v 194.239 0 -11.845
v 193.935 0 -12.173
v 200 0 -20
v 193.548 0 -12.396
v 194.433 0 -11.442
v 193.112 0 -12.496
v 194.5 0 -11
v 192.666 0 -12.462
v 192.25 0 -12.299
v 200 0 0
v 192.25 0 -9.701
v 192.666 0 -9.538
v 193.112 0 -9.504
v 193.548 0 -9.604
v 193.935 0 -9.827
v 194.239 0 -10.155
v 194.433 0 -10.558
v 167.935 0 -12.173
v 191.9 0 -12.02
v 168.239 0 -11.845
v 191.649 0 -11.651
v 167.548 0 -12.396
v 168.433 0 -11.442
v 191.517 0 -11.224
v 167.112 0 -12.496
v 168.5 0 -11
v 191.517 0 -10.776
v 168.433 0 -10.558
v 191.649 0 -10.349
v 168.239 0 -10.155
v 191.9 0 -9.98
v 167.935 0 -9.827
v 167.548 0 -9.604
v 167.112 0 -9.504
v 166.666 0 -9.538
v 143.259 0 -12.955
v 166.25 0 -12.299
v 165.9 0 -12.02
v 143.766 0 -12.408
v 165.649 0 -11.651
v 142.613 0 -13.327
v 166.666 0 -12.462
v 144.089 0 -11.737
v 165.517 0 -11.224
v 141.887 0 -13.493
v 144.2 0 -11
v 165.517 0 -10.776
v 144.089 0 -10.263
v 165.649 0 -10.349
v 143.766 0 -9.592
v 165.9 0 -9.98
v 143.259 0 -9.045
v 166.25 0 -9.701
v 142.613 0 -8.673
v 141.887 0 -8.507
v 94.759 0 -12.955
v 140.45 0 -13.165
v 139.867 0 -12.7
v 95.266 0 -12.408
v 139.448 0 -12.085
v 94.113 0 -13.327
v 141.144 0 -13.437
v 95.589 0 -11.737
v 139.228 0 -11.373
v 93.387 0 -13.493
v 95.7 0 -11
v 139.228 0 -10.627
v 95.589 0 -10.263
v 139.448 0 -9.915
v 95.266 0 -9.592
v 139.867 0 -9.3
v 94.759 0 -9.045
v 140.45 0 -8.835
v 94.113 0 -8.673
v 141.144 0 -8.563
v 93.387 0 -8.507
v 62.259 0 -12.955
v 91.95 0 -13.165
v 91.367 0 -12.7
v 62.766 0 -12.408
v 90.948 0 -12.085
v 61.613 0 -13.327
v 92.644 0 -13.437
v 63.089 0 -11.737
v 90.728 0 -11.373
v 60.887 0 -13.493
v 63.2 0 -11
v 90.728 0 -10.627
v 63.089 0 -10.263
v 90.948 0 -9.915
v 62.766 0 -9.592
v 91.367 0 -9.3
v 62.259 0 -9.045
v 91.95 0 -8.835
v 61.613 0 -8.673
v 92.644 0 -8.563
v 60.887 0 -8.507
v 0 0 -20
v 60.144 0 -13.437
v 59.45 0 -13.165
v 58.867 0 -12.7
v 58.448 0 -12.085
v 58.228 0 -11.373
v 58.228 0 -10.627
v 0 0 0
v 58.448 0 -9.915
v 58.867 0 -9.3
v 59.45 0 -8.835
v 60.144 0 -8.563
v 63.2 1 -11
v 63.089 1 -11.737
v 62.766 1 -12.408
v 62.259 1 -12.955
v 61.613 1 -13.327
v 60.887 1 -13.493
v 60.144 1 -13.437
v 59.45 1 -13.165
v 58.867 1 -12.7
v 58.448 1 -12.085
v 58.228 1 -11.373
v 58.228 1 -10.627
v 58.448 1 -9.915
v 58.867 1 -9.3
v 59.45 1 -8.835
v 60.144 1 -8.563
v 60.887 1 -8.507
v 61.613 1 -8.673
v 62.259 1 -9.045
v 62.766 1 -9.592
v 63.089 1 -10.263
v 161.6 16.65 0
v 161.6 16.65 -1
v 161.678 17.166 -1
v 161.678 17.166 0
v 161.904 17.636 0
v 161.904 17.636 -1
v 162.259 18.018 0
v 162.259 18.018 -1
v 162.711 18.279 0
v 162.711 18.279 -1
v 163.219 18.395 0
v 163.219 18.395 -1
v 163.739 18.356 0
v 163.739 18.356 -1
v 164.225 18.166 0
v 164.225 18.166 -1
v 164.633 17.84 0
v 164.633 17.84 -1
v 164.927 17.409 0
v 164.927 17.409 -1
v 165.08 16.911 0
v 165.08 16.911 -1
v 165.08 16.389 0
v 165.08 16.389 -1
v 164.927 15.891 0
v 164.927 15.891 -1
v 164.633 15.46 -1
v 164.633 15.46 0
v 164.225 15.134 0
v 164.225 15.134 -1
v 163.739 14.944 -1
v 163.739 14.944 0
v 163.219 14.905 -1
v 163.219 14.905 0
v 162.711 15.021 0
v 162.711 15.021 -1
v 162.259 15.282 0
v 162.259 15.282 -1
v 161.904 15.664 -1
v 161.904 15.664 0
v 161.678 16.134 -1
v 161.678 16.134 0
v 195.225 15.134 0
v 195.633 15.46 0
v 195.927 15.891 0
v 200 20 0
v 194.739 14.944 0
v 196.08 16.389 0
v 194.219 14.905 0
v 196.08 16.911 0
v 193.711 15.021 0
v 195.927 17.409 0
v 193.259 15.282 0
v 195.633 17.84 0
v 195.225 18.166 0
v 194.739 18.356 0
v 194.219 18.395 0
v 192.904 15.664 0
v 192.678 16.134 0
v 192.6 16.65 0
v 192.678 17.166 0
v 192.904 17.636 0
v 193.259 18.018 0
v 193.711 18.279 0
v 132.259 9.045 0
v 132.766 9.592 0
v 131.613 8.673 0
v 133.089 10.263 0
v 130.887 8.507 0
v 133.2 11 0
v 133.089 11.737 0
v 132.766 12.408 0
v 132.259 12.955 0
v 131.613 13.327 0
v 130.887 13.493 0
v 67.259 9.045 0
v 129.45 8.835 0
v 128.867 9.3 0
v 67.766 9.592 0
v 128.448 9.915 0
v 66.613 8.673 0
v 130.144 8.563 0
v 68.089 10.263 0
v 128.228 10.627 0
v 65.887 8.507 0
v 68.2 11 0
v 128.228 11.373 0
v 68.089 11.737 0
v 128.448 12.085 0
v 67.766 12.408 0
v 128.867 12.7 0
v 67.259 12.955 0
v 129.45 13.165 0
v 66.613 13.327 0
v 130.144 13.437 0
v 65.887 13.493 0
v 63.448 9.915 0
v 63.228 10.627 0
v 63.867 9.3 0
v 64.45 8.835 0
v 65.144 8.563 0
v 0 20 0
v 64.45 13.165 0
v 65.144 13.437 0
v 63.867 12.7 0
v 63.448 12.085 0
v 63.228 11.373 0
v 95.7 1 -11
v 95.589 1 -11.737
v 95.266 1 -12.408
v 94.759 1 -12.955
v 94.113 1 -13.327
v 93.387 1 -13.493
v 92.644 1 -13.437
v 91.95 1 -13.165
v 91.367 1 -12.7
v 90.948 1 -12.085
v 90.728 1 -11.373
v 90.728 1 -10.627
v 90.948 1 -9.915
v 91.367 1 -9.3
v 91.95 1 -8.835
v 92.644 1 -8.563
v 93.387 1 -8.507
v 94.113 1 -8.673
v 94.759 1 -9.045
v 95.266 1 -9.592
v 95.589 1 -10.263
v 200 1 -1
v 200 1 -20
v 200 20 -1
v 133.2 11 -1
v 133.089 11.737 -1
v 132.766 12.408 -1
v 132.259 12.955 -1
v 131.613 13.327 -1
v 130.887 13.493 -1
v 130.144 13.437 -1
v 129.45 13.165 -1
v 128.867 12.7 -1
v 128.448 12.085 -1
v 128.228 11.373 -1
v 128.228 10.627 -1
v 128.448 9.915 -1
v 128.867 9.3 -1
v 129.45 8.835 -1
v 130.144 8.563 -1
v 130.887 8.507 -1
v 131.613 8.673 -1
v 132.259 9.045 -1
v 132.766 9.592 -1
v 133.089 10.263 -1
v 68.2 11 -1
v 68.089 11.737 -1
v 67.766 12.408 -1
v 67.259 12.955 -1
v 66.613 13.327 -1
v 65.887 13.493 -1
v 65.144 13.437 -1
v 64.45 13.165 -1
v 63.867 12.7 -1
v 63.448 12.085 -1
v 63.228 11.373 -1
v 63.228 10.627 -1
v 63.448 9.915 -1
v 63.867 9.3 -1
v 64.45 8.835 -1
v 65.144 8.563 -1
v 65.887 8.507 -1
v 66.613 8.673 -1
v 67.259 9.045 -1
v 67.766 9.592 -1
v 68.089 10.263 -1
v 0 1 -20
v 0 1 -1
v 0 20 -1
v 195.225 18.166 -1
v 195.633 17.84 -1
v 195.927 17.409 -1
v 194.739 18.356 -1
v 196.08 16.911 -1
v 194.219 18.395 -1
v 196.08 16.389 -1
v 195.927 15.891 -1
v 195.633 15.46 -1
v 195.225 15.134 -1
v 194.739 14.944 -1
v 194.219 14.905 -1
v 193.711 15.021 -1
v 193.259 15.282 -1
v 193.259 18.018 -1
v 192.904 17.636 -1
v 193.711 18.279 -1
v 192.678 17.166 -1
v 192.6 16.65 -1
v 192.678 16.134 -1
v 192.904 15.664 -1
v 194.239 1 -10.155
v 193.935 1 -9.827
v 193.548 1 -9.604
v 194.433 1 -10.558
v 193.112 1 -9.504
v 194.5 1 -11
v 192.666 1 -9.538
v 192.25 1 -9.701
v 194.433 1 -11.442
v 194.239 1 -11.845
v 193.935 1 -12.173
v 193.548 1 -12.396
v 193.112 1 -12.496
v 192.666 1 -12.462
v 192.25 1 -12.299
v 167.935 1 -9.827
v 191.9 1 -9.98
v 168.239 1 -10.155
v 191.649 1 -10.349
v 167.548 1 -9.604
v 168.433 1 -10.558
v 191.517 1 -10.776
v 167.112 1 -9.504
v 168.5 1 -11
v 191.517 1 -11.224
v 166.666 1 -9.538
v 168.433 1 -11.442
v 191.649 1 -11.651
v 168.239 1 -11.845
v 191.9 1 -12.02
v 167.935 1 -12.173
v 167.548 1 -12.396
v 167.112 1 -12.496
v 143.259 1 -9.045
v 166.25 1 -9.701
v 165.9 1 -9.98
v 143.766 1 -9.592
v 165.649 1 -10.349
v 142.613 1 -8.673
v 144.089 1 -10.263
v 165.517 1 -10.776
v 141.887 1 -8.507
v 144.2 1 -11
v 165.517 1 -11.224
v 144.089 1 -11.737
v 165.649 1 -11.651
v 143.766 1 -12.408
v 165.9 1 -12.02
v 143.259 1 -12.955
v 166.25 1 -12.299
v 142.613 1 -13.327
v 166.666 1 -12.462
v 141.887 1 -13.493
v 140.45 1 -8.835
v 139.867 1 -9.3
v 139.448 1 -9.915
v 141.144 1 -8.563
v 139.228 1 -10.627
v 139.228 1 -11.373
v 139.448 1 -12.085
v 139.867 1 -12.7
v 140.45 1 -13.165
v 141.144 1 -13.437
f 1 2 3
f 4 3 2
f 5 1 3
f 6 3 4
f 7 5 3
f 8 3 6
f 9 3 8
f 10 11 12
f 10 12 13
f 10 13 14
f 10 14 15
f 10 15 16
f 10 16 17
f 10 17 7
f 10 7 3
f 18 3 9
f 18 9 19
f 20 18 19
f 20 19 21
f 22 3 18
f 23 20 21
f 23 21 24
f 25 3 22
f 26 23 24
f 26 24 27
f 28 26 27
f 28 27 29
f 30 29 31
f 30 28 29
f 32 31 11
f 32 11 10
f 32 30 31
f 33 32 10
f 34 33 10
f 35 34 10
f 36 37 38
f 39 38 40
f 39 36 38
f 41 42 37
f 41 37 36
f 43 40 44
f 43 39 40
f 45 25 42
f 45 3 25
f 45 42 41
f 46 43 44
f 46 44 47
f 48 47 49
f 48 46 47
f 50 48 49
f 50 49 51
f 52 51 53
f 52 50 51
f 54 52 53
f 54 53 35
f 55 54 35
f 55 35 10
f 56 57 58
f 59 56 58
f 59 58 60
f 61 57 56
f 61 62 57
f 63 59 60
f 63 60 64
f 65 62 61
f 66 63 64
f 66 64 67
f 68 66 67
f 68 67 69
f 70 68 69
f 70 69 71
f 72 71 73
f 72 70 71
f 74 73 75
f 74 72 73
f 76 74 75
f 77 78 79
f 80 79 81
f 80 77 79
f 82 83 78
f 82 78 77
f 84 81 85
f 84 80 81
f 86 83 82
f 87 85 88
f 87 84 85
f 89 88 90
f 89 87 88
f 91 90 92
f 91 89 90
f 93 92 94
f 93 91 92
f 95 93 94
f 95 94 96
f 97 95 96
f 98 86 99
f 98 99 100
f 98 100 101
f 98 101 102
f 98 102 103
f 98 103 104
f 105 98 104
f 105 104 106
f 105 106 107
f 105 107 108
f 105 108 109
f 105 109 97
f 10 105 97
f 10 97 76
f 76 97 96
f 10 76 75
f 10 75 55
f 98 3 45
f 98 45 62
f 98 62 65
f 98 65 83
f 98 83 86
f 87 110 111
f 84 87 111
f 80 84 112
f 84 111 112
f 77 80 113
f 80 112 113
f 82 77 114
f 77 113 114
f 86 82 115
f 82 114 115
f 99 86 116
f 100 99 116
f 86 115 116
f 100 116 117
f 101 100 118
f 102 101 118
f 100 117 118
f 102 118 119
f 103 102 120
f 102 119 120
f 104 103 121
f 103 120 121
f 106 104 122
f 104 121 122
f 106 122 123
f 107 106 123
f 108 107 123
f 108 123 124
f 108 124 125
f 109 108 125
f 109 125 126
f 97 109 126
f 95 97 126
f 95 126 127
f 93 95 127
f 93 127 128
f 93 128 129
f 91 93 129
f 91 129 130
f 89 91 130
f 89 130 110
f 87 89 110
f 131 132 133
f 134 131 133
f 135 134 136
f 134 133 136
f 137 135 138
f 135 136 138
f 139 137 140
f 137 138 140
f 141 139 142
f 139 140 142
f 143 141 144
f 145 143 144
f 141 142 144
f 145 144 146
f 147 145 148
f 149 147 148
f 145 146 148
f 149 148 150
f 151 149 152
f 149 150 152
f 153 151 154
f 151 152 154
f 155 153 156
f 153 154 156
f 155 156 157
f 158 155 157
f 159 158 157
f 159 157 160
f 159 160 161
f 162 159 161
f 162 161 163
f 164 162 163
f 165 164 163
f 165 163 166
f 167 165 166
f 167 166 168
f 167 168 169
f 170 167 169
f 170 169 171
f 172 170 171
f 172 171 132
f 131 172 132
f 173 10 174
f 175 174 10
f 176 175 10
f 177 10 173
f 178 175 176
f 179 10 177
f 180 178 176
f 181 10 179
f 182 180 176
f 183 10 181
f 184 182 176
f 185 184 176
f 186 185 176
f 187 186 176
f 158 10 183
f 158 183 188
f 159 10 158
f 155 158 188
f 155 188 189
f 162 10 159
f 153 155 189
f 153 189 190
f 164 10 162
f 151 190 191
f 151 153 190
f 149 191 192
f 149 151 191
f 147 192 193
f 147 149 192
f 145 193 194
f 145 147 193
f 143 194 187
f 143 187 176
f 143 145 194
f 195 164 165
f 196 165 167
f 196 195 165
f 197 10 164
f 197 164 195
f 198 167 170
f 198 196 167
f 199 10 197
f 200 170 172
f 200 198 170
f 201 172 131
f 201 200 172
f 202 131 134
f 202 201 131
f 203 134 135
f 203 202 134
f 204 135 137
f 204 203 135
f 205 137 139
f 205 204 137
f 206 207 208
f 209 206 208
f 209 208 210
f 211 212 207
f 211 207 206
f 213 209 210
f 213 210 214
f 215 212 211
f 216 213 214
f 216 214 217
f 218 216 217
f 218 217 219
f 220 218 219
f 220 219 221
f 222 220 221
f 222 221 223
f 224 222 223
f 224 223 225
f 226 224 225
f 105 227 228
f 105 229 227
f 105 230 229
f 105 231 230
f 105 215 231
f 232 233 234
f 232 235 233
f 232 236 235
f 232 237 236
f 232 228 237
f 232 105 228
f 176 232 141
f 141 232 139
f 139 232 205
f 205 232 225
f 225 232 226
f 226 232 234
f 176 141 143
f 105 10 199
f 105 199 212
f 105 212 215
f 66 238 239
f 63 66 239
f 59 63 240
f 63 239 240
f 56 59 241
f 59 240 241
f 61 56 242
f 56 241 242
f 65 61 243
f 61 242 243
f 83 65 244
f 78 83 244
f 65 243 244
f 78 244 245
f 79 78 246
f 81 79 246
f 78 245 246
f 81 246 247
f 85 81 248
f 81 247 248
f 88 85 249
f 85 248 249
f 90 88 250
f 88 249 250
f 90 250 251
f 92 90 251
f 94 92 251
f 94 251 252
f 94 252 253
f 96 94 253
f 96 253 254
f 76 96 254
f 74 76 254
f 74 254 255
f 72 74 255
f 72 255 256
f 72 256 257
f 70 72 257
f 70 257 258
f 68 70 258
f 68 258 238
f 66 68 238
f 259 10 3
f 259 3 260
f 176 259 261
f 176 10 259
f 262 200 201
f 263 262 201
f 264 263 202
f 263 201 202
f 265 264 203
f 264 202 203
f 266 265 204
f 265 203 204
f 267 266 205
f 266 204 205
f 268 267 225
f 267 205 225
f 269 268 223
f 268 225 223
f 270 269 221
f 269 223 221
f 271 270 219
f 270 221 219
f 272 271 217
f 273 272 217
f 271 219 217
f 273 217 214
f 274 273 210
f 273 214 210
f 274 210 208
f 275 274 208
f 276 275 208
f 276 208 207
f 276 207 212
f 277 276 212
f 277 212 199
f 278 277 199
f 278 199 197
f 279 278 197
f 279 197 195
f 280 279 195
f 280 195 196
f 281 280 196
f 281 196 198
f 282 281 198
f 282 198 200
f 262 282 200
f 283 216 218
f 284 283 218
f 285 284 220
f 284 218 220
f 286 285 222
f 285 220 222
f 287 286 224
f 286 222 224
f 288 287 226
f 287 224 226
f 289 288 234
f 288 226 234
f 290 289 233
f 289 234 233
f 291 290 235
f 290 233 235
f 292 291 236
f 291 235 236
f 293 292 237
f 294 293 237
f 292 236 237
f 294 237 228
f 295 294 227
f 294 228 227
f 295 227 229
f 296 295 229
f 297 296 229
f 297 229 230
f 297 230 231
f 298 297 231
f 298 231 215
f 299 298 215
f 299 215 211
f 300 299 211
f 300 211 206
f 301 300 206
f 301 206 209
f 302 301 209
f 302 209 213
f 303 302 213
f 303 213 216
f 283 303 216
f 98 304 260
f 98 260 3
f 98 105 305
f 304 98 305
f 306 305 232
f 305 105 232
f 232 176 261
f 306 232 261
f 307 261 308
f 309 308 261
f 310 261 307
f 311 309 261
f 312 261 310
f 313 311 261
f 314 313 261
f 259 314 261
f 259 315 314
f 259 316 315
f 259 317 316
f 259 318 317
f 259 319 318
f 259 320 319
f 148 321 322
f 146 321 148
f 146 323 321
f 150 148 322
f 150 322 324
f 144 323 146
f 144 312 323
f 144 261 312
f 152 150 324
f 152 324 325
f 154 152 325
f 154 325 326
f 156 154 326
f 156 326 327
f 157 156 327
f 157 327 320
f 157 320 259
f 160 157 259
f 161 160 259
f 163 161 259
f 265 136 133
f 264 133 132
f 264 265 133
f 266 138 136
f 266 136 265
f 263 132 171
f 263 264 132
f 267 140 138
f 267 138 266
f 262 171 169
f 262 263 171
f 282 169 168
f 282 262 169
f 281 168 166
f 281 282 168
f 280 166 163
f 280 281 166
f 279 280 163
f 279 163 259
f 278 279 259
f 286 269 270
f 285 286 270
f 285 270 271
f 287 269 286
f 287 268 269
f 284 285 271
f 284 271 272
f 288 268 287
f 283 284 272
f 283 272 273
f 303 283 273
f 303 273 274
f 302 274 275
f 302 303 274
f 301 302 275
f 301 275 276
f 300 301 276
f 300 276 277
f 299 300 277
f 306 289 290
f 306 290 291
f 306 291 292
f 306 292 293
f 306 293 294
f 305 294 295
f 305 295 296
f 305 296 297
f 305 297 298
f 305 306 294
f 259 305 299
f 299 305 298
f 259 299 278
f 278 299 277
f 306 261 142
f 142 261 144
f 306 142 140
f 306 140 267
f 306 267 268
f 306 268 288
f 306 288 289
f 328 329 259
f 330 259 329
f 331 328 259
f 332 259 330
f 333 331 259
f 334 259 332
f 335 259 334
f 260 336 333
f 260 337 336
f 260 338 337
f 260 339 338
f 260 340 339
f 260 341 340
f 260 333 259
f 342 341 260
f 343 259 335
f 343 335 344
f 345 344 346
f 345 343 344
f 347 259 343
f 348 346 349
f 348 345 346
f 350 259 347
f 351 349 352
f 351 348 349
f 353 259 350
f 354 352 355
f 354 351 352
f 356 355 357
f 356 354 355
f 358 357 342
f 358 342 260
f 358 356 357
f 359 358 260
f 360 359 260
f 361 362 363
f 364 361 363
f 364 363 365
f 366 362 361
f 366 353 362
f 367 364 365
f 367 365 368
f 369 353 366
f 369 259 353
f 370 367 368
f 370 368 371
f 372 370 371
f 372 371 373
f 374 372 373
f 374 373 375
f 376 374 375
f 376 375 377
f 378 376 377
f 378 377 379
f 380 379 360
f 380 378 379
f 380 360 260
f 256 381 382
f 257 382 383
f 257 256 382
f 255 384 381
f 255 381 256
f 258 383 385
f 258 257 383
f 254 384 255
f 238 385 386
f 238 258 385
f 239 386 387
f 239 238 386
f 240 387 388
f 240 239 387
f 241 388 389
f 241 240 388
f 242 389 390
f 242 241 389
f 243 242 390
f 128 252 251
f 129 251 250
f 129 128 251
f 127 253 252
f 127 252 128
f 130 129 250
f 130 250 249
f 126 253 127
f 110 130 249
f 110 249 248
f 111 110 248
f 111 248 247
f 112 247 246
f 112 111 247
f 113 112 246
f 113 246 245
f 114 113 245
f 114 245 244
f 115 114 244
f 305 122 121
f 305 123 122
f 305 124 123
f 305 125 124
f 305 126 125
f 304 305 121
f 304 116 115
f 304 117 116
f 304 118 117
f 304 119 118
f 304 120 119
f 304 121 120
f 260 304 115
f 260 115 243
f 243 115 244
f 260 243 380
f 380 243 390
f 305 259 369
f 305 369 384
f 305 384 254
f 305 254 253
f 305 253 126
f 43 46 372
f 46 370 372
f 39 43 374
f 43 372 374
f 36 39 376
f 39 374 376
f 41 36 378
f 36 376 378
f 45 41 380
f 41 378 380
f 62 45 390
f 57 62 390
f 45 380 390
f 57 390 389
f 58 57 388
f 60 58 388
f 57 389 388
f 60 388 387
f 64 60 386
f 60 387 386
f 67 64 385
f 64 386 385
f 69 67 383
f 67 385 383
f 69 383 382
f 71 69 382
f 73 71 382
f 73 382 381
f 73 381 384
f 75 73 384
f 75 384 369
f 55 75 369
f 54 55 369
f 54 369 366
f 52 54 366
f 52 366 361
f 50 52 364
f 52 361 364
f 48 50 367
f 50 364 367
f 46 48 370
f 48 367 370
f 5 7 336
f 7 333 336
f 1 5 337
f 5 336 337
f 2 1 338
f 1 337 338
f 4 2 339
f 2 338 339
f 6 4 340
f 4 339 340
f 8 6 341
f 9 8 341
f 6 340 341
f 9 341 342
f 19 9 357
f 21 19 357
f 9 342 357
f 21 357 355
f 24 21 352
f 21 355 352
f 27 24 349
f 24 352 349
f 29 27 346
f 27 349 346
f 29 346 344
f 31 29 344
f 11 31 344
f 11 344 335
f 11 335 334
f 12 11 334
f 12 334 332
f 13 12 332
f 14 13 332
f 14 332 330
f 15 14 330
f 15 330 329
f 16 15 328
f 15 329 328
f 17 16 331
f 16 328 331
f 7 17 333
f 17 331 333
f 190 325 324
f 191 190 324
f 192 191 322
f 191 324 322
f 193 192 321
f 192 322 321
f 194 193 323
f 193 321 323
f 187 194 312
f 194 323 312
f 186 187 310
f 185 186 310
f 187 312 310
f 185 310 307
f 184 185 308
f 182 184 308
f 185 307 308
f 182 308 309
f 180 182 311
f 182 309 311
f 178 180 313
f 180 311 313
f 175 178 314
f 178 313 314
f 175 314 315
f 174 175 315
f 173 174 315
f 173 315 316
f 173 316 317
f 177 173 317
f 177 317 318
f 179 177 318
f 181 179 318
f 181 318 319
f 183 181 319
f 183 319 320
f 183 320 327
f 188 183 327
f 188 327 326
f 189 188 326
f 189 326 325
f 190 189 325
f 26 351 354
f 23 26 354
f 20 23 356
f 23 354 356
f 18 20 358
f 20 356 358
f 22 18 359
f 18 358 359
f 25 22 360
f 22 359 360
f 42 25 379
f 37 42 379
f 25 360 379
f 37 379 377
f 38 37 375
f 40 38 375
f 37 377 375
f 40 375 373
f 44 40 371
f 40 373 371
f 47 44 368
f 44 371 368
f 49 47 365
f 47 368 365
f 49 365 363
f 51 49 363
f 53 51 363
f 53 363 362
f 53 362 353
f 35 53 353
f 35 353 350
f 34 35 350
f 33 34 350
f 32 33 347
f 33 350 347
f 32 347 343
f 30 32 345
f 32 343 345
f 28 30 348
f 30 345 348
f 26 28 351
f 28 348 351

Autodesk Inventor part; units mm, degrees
ref_plane "YZ Plane" through (0, 0, 0) normal (1, 0, 0) x (0, 1, 0)
ref_plane "XZ Plane" through (0, 0, 0) normal (0, 1, 0) x (-1, 0, 0)
ref_plane "XY Plane" through (0, 0, 0) normal (0, 0, 1) x (1, 0, 0)
sketch "Boceto1" plane through (0, 0, 0) normal (1, 0, 0) x (0, 1, 0)
  line L0 (0, 0) -> (20, 0)
  line L1 (20, 0) -> (20, -1)
  line L2 (20, -1) -> (0, -1)
  line L3 (0, -1) -> (0, 0)
  line L4 (0, 0) -> (1, 0)
  line L5 (1, 0) -> (1, -20)
  line L6 (1, -20) -> (0, -20)
  line L7 (0, -20) -> (0, 0)
  point P0 (1, -1)
  dimension "d0" = 20
  dimension "d1" = 20
  dimension "d2" = 1
  dimension "d3" = 1
extrude "Extrusión1" add sketch "Boceto1" along normal blind 200
sketch "Boceto2" plane through (0, 1, -1) normal (0, 0, -1) x (-1, 0, 0)
  circle A0 centre (-194.35, 15.65) radius 1.75
  line L0 (0, 19) -> (-200, 19) projected
  line L1 (-200, 0) -> (-200, 19) projected
  circle A1 centre (-163.35, 15.65) radius 1.75
  point P0 (0, -1)
  dimension "d6" = 3.5
  dimension "d7" = 3.35
  dimension "d8" = 5.65
  dimension "d11" = 3.5
  dimension "d12" = 31
  dimension "d13" = 3.35
extrude "Extrusión2" cut sketch "Boceto2" against normal through all
sketch "Boceto3" plane through (0, 1, -1) normal (0, 1, 0) x (1, 0, 0)
  circle A0 centre (193, 10) radius 1.5
  circle A1 centre (167, 10) radius 1.5
  line L0 (0, 19) -> (200, 19) projected
  line L1 (200, 19) -> (200, 0) projected
  point P0 (0, -1)
  dimension "d14" = 3
  dimension "d15" = 3
  dimension "d16" = 9
  dimension "d17" = 9
  dimension "d18" = 7
  dimension "d19" = 26
extrude "Extrusión3" cut sketch "Boceto3" against normal through all
sketch "Boceto4" plane through (0, 0, 0) normal (0, 0, 1) x (1, 0, 0)
  circle A0 centre (65.7, 11) radius 2.5
  line L0 (200, 20) -> (200, 0) projected
  circle A1 centre (130.7, 11) radius 2.5
  line L1 (0, 20) -> (200, 20) projected
  point P0 (0, 0)
  dimension "d22" = 134.3
  dimension "d23" = 69.3
  dimension "d24" = 9
  dimension "d25" = 9
  dimension "d28" = 5
  dimension "d29" = 5
extrude "Extrusión4" cut sketch "Boceto4" against normal through all
sketch "Boceto5" plane through (0, 1, -1) normal (0, 1, 0) x (1, 0, 0)
  circle A0 centre (60.7, 10) radius 2.5
  line L0 (0, 19) -> (200, 19) projected
  line L1 (0, 19) -> (0, 0) projected
  circle A1 centre (93.2, 10) radius 2.5
  circle A2 centre (141.7, 10) radius 2.5
  point P0 (0, -1)
  dimension "d30" = 5
  dimension "d31" = 9
  dimension "d32" = 60.7
  dimension "d33" = 5
  dimension "d35" = 5
  dimension "d36" = 48.5
  dimension "d39" = 32.5
extrude "Extrusión5" cut sketch "Boceto5" against normal through all
equation "\"d1\" = d0"
equation "\"d3\" = d2"
equation "\"d11\" = d6"
equation "\"d13\" = d7"
equation "\"d15\" = d14"
equation "\"d17\" = d16"
equation "\"d24\" = d25"
equation "\"d29\" = d28"
equation "\"d33\" = d30"
equation "\"d35\" = d33"
properties part number "Angulo 2020x450" material "Madera (cerezo)"
